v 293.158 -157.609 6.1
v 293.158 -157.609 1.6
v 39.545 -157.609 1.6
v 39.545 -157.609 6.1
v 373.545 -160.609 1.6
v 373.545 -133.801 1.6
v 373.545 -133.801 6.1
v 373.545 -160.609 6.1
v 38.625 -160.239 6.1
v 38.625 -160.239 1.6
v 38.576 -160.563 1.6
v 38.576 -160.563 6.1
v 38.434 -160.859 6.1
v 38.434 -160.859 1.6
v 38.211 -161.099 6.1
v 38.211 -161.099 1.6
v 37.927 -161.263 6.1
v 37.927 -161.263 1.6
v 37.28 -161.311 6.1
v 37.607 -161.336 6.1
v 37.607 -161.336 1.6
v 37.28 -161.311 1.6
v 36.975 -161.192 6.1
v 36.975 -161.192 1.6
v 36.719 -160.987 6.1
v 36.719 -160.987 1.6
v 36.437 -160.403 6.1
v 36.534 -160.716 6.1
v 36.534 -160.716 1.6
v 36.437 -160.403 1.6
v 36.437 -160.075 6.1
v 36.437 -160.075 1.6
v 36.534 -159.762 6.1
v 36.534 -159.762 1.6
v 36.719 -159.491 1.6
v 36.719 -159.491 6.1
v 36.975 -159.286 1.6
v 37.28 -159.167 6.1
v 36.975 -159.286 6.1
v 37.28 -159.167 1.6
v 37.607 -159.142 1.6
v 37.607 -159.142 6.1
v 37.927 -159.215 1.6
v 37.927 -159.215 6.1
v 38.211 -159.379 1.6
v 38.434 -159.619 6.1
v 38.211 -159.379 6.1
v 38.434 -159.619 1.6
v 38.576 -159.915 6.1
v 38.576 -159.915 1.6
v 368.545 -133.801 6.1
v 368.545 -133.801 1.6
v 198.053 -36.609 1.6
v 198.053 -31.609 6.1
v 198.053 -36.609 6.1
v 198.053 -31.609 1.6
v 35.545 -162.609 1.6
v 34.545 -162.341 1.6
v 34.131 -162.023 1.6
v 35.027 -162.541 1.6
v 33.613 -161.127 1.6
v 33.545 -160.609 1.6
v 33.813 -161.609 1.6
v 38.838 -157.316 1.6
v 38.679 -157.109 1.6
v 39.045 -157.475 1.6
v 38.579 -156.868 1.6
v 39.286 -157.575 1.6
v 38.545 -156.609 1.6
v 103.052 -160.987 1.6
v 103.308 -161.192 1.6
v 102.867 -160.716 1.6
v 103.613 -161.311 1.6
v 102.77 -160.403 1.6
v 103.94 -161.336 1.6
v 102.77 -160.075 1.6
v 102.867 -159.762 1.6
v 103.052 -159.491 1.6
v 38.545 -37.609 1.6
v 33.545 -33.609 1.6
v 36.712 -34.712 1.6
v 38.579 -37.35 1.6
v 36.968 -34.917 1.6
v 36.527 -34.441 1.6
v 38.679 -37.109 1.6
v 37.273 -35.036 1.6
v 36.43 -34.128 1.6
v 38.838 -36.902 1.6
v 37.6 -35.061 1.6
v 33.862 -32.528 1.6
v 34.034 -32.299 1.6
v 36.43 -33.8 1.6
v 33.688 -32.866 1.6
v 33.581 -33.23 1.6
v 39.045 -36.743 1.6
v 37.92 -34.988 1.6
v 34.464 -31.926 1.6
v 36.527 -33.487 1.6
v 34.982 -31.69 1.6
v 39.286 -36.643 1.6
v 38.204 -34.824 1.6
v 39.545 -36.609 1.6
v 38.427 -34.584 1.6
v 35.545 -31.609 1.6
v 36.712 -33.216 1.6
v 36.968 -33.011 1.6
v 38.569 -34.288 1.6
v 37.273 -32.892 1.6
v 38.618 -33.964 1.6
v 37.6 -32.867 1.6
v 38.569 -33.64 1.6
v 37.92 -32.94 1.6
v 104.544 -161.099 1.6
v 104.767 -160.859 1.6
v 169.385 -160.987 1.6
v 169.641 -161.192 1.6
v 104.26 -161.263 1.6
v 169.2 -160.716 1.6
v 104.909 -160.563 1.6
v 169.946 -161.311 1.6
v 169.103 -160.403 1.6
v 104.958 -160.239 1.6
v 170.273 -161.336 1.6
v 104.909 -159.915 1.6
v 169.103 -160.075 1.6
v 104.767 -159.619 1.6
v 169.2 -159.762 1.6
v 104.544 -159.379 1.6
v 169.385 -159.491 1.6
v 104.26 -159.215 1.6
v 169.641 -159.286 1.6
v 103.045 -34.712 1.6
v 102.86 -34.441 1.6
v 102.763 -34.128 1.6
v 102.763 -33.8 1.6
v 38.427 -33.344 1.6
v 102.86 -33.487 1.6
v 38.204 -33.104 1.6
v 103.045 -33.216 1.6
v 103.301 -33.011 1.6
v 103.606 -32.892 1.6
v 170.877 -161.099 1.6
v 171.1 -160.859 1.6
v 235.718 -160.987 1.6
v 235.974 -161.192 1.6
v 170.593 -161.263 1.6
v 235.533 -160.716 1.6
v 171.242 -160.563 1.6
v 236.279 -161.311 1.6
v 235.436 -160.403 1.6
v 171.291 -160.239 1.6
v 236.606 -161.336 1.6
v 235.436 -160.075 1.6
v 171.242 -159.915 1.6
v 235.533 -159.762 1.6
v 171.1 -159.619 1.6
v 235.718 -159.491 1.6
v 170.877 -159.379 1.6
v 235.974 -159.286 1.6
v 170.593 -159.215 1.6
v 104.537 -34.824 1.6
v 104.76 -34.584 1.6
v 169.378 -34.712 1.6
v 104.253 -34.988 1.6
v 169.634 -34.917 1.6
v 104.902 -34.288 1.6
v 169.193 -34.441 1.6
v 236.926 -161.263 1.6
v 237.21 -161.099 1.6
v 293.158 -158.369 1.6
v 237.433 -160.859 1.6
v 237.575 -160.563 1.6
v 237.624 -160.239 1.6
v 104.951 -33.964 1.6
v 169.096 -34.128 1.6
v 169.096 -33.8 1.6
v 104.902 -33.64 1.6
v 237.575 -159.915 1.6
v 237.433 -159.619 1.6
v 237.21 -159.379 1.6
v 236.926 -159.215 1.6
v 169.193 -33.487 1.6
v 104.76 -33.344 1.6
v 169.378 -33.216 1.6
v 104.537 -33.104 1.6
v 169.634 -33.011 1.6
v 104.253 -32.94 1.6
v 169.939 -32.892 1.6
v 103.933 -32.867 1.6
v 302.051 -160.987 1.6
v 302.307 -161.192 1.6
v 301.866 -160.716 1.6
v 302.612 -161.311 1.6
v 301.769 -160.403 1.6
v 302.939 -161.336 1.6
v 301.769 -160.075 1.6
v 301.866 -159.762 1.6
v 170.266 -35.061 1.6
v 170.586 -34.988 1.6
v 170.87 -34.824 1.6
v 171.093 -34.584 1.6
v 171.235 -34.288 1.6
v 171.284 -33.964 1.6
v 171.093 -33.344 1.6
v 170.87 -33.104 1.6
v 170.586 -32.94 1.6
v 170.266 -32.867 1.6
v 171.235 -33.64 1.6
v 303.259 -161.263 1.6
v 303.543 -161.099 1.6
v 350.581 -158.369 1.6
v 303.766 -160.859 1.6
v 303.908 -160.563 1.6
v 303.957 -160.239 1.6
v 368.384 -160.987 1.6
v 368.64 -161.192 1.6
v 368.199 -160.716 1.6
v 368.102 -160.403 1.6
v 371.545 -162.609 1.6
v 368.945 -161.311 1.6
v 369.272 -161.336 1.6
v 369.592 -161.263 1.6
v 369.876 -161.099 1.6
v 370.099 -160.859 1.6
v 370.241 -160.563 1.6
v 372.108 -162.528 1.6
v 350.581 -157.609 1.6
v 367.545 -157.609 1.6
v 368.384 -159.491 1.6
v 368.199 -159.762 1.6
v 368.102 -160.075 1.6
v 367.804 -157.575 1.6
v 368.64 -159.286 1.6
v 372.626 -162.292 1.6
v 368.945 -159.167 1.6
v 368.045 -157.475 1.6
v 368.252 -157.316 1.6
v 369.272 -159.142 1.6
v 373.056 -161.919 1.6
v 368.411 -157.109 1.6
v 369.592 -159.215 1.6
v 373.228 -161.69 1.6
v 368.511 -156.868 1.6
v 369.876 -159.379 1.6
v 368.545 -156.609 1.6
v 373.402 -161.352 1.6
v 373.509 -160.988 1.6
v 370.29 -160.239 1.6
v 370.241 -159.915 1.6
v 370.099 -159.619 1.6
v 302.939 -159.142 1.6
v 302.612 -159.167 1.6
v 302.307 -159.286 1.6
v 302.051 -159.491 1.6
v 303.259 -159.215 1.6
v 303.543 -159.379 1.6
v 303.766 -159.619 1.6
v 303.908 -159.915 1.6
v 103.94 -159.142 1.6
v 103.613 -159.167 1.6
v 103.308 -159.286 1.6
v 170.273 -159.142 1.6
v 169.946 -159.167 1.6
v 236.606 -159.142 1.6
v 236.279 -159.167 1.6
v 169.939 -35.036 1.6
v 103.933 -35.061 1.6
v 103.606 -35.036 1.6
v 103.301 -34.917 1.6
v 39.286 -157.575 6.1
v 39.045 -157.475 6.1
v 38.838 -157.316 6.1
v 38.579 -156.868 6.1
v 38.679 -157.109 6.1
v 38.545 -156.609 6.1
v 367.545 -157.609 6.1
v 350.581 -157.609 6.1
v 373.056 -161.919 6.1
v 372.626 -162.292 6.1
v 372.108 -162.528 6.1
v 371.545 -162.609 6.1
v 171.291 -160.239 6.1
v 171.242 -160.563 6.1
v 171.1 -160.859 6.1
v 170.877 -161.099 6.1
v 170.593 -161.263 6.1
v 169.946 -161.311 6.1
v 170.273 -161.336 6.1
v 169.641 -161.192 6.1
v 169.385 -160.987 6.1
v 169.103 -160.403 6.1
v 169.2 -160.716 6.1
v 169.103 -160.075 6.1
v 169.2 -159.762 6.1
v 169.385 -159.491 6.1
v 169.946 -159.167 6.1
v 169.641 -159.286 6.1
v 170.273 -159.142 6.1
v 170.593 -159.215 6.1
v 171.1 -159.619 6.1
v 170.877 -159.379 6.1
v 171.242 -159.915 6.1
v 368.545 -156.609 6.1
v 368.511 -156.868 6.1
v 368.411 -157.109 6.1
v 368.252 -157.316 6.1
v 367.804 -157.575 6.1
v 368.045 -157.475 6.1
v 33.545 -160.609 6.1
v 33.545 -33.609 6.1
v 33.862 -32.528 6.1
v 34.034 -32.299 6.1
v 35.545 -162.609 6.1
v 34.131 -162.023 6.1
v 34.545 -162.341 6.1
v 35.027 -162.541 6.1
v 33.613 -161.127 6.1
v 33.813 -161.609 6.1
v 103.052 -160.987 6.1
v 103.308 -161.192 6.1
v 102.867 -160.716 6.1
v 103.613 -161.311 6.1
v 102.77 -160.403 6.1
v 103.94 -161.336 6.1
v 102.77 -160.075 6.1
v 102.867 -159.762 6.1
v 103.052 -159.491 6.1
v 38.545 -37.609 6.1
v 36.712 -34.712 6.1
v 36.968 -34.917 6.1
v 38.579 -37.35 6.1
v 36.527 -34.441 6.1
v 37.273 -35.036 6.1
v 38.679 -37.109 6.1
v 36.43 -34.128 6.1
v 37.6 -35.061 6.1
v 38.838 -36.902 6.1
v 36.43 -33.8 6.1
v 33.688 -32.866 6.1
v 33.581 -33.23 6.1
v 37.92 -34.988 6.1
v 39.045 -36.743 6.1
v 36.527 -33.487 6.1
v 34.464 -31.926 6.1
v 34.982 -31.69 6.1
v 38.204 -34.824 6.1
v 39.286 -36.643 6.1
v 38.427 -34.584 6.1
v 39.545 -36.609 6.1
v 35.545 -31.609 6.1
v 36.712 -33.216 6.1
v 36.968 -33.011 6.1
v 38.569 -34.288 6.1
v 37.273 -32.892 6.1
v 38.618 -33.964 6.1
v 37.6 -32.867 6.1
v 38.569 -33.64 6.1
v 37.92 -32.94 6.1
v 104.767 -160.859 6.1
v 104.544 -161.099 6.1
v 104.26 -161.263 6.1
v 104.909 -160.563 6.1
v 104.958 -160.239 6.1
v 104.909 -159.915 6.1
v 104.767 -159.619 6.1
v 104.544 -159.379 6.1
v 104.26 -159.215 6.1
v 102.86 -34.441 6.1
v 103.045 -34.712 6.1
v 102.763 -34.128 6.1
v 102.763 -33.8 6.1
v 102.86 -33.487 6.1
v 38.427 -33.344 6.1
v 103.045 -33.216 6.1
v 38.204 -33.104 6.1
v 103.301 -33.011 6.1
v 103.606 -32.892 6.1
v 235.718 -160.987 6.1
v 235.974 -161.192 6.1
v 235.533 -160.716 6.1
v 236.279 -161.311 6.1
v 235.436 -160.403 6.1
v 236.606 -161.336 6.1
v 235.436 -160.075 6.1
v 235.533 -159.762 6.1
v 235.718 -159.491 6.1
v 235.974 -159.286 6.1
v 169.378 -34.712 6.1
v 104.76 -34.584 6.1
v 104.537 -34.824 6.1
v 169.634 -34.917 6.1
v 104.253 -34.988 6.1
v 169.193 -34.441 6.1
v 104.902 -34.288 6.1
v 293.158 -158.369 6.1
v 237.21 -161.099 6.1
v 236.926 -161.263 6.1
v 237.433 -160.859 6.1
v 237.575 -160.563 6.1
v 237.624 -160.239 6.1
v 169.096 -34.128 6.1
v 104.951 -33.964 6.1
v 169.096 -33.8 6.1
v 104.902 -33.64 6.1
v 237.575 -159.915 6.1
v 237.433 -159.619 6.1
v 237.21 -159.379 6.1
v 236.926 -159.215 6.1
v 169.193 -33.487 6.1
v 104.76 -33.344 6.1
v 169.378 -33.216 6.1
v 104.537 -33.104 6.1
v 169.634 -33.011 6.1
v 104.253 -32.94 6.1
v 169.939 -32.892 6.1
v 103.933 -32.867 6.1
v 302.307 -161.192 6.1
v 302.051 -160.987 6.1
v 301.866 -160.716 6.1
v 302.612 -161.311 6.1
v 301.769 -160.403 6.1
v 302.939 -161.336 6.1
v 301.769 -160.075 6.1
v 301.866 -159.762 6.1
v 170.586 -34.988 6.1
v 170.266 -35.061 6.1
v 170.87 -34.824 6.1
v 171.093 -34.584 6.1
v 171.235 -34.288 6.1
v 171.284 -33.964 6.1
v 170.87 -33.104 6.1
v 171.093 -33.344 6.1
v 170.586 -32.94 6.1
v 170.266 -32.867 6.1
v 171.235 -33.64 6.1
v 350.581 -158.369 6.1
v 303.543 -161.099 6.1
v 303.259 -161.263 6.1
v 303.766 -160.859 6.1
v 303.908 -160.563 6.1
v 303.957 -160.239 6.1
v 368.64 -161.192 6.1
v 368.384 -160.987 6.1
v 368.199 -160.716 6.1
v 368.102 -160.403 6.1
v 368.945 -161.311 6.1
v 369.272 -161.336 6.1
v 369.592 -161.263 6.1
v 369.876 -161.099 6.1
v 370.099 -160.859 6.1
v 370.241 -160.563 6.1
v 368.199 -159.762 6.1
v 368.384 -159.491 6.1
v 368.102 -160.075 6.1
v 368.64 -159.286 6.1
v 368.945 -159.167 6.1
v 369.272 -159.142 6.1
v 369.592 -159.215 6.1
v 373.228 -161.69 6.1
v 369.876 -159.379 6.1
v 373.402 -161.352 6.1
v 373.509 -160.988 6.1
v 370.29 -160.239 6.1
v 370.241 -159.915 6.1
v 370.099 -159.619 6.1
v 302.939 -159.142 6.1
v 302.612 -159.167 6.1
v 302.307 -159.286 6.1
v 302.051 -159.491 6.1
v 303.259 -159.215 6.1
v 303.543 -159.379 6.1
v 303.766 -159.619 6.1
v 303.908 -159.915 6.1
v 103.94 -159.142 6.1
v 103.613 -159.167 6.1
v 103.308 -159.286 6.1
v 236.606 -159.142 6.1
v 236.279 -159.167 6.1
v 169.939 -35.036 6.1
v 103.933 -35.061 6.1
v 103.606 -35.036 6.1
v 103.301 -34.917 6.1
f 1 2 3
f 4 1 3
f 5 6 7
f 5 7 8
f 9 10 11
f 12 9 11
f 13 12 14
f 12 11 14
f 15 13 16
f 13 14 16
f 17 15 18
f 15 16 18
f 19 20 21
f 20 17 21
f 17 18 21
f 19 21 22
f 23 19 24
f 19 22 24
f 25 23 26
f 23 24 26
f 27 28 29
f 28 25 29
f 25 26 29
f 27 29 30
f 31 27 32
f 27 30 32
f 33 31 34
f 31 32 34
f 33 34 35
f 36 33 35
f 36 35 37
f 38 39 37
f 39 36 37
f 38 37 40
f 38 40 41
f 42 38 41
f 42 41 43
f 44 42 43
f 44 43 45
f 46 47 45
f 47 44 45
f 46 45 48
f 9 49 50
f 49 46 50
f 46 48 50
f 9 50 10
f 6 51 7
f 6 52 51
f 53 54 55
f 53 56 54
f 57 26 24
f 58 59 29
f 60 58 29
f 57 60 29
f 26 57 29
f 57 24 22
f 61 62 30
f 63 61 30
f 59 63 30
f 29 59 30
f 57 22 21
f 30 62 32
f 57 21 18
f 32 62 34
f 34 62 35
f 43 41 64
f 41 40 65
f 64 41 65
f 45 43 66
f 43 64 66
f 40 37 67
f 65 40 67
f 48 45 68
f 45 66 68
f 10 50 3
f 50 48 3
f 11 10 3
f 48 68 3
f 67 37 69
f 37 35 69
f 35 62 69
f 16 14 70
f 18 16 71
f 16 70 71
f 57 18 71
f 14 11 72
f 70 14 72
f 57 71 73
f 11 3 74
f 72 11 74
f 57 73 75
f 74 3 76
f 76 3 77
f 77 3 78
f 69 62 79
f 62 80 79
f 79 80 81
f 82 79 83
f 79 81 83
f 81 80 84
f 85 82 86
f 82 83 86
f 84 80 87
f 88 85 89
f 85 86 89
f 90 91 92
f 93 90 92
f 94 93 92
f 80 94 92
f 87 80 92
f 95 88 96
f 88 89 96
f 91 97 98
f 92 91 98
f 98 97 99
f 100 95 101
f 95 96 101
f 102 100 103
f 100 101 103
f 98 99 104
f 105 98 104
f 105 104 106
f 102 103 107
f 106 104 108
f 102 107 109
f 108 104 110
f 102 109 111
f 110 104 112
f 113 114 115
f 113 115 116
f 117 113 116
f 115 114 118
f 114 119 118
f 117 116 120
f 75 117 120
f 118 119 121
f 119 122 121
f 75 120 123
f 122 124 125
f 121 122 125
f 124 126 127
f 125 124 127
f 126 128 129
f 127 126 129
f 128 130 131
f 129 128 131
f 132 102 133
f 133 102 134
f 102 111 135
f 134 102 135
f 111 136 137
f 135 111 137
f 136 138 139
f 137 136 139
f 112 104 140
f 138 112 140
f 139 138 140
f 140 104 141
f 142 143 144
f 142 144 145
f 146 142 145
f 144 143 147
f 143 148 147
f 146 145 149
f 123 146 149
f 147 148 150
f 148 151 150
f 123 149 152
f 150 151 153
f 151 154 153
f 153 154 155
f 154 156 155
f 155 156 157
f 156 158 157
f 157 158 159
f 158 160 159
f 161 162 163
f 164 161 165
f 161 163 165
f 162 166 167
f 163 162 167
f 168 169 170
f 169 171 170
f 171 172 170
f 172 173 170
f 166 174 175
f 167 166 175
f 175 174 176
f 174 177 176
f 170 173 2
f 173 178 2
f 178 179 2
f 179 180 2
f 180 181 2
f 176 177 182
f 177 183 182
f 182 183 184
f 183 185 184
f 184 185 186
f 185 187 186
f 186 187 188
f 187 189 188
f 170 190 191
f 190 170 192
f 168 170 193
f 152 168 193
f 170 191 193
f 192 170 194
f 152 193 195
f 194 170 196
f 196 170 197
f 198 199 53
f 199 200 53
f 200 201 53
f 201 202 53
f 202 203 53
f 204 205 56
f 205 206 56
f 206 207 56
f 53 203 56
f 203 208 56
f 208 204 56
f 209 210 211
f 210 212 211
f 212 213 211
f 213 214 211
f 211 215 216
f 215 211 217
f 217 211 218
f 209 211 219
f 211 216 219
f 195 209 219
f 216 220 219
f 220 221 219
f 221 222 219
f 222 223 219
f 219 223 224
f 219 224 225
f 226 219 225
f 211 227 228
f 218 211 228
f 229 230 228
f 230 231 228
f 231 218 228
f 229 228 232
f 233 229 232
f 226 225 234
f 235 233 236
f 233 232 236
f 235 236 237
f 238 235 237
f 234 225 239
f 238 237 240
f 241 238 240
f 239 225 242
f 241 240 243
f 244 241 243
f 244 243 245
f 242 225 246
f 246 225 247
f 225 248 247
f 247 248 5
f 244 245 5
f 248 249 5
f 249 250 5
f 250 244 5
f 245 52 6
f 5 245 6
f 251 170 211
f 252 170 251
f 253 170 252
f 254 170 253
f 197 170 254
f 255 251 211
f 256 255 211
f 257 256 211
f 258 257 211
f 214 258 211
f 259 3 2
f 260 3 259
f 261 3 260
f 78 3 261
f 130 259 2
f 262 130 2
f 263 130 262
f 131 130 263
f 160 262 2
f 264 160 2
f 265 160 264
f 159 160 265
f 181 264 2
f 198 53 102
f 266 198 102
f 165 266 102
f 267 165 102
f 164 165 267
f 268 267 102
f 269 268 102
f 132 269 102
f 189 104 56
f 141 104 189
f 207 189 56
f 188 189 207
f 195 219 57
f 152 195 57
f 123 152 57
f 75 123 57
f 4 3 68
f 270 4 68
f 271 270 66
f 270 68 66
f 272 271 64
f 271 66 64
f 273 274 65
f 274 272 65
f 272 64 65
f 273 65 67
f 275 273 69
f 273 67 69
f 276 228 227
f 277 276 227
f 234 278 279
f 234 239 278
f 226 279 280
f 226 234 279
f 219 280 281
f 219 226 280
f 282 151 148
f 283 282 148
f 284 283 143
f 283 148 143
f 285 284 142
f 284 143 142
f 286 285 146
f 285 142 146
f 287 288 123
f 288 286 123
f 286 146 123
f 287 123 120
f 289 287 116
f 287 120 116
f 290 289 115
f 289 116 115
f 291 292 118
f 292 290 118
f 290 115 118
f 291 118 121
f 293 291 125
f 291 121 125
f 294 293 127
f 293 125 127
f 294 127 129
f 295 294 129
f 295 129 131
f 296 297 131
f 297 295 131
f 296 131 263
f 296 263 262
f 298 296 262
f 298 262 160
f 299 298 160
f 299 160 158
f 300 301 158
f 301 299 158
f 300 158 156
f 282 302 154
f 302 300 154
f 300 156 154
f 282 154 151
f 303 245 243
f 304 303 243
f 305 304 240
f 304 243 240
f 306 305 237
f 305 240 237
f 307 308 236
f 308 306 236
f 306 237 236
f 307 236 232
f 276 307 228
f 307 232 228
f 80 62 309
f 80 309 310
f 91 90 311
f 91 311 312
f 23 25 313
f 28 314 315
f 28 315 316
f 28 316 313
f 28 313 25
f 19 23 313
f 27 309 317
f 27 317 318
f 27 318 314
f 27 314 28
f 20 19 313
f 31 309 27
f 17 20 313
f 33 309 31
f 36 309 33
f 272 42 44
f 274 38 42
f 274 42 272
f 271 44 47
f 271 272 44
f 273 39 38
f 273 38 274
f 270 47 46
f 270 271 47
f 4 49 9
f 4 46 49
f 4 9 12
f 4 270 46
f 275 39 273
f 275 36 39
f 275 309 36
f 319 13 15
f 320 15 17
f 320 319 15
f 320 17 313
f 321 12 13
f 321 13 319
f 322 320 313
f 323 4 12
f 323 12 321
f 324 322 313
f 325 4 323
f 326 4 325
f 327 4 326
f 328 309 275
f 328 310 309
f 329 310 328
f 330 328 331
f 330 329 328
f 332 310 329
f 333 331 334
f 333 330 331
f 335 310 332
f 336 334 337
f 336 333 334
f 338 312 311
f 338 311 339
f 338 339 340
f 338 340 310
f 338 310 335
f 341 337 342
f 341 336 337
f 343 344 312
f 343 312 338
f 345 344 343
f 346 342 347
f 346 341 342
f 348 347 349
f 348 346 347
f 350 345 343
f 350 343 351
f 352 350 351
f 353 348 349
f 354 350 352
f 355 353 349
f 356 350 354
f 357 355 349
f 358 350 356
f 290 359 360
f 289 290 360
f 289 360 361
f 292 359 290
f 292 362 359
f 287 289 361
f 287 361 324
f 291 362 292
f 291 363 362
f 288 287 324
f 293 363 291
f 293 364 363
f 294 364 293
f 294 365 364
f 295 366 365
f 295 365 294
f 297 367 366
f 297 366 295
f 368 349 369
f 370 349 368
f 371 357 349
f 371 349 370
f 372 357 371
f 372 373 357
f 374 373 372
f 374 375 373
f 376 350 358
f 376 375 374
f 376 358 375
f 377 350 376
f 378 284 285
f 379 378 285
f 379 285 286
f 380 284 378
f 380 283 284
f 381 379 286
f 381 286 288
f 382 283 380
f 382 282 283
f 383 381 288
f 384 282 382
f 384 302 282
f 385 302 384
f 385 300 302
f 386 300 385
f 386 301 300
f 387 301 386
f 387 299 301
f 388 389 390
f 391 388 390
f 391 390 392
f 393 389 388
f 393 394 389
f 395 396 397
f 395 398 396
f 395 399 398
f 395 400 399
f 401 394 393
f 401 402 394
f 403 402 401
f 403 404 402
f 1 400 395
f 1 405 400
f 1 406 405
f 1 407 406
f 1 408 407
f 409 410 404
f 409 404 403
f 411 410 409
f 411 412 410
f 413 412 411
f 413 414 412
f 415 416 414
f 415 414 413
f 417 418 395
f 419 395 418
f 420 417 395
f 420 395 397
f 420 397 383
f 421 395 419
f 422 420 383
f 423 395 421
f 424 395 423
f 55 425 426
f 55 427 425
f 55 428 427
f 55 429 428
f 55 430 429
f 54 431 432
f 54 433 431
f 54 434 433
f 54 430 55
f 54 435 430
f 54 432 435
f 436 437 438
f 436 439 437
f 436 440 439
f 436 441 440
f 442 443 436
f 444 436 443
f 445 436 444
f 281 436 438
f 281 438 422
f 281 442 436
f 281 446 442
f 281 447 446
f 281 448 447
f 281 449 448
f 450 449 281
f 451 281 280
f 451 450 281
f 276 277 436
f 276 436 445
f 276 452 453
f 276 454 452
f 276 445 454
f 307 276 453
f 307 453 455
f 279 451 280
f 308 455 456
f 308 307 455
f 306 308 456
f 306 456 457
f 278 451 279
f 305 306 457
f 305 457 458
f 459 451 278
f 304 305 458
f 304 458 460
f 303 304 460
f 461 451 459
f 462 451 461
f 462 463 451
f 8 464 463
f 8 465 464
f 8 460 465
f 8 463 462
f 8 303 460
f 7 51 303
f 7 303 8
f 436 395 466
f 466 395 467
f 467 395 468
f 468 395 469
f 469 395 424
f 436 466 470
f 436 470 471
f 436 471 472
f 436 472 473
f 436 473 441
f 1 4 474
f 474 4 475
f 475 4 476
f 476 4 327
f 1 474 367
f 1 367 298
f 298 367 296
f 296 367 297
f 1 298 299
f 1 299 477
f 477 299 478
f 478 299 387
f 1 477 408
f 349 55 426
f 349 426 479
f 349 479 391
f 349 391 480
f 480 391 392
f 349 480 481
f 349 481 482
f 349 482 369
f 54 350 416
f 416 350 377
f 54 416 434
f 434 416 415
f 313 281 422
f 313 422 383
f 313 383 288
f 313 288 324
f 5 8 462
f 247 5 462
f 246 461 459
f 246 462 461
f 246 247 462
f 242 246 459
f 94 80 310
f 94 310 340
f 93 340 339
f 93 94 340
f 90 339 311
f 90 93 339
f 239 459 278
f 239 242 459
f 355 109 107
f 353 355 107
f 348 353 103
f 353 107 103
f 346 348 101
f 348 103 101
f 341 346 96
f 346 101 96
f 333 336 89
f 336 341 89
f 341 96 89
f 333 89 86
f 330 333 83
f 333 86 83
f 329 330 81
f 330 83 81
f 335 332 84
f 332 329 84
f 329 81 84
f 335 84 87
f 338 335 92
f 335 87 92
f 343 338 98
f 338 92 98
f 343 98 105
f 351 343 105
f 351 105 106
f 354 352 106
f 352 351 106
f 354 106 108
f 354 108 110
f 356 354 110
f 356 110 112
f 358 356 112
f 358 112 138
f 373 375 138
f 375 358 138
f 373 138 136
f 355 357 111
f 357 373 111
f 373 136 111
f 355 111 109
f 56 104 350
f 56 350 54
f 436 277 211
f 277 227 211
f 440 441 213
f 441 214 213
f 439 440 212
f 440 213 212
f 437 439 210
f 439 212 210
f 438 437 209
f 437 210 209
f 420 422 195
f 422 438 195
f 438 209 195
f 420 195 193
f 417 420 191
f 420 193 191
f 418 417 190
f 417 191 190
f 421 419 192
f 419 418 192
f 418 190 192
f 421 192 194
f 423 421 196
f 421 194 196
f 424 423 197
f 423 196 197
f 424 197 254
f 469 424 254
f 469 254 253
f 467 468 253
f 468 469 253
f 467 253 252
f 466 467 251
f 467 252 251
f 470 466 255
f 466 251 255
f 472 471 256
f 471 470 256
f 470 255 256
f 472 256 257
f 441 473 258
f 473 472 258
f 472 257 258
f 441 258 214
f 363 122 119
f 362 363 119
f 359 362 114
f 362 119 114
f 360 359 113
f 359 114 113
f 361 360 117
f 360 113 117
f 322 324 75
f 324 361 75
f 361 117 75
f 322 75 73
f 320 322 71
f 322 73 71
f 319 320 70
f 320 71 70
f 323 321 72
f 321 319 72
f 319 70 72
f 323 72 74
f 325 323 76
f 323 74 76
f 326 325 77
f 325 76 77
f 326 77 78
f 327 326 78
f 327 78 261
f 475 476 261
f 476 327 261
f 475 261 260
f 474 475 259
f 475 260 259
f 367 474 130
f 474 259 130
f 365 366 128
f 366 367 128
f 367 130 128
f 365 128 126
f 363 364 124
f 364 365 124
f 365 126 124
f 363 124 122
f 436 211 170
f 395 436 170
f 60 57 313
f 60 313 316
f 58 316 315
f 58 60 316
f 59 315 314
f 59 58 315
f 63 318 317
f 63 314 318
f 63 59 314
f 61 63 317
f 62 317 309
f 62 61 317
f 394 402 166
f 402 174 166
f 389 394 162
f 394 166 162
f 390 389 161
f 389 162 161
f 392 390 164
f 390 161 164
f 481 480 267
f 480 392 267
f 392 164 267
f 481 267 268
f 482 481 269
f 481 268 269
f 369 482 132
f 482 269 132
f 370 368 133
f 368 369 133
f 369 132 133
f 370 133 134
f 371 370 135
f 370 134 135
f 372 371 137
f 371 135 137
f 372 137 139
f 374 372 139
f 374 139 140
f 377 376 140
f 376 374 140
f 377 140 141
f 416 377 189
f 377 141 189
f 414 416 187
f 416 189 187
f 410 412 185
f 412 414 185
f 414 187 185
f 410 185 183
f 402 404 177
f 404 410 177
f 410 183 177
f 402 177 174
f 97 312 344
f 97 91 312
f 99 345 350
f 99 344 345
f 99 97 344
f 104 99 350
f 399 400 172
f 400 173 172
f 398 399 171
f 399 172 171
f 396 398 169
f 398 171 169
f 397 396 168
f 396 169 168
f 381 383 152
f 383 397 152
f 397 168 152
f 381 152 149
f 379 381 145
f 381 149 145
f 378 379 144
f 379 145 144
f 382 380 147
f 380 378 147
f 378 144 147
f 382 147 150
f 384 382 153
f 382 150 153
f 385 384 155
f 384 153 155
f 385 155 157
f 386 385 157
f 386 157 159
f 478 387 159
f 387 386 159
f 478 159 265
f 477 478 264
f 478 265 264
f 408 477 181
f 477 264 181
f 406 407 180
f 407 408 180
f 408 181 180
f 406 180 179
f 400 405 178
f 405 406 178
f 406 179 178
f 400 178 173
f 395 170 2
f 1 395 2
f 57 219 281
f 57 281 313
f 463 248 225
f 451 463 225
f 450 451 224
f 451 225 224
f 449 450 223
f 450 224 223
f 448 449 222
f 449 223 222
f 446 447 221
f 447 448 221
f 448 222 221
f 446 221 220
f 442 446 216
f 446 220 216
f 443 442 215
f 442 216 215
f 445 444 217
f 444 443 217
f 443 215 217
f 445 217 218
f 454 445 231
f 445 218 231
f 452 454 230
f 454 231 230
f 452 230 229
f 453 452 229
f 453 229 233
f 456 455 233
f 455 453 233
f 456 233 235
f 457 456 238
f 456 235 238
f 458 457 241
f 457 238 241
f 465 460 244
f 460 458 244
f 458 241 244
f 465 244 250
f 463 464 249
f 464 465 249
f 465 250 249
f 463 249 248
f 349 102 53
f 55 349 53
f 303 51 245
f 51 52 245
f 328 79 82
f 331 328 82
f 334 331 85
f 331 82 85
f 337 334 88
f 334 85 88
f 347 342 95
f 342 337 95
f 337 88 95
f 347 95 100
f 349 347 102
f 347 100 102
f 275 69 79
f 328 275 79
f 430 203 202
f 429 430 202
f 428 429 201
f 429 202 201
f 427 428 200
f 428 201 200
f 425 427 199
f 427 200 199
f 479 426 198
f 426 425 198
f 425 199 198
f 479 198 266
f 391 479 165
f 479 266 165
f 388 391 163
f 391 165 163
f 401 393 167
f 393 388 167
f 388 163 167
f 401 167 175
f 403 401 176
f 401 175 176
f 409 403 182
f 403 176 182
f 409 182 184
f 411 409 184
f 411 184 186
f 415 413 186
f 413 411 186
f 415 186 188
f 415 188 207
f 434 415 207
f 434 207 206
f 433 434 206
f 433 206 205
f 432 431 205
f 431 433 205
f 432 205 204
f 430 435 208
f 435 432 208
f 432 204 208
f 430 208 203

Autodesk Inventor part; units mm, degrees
ref_plane "YZ Plane" through (0, 0, 0) normal (1, 0, 0) x (0, 1, 0)
ref_plane "XZ Plane" through (0, 0, 0) normal (0, 1, 0) x (-1, 0, 0)
ref_plane "XY Plane" through (0, 0, 0) normal (0, 0, 1) x (1, 0, 0)
ref_plane "Work Plane2" through (35.545, -31.609, 1.6) normal (0, 0, 1) x (1, 0, 0)
ref_plane "Work Plane1" through (35.545, -31.609, 1.6) normal (0, 0, 1) x (1, 0, 0)
sketch "Sketch1" plane through (35.545, -31.609, 1.6) normal (0, 0, 1) x (1, 0, 0)
  line L0 (0, 0) -> (336, 0) projected
  line L1 (-2, -129) -> (-2, -2) projected
  line L2 (-1.6825, -0.9187) -> (-1.5115, -0.6903) projected
  arc A0 (0, 0) -> (-2, -2) centre (0, -2) ccw
  line L3 (338, -2) -> (338, -129) projected
  line L4 (337.5115, -0.6903) -> (337.6825, -0.9187) projected
  arc A1 (338, -2) -> (336, 0) centre (336, -2) ccw
  line L5 (336, -131) -> (0, -131) projected
  line L6 (337.6825, -130.0813) -> (337.5115, -130.3097) projected
  arc A2 (336, -131) -> (338, -129) centre (336, -129) ccw
  arc A3 (-2, -129) -> (0, -131) centre (0, -129) ccw
  circle A4 centre (1.98, -128.63) radius 1.1 projected
  circle A5 centre (1.98, -128.63) radius 1.1
  circle A6 centre (68.313, -128.63) radius 1.1 projected
  circle A7 centre (134.646, -128.63) radius 1.1 projected
  circle A8 centre (134.646, -128.63) radius 1.1
  circle A9 centre (68.313, -128.63) radius 1.1
  circle A10 centre (200.979, -128.63) radius 1.1 projected
  circle A11 centre (267.312, -128.63) radius 1.1 projected
  circle A12 centre (333.645, -128.63) radius 1.1 projected
  circle A13 centre (333.645, -128.63) radius 1.1
  circle A14 centre (267.312, -128.63) radius 1.1
  circle A15 centre (200.979, -128.63) radius 1.1
  circle A16 centre (333.638, -2.355) radius 1.1 projected
  circle A17 centre (1.973, -2.355) radius 1.1 projected
  circle A18 centre (68.306, -2.355) radius 1.1 projected
  circle A19 centre (134.639, -2.355) radius 1.1 projected
  circle A20 centre (200.972, -2.355) radius 1.1 projected
  circle A21 centre (267.305, -2.355) radius 1.1 projected
  circle A22 centre (333.645, -2.355) radius 1.093
  circle A23 centre (267.305, -2.355) radius 1.1
  circle A24 centre (200.972, -2.355) radius 1.1
  circle A25 centre (134.639, -2.355) radius 1.1
  circle A26 centre (68.306, -2.355) radius 1.1
  circle A27 centre (1.973, -2.355) radius 1.1
  line L7 (3, -4.2357) -> (125.2758, -4.2357) construction
  line L8 (4, -5) -> (332, -5)
  line L9 (333, -6) -> (333, -125)
  line L10 (332, -126) -> (4, -126)
  line L11 (3, -125) -> (3, -6)
  arc A28 (4, -5) -> (3, -6) centre (4, -6) ccw
  arc A29 (333, -6) -> (332, -5) centre (332, -6) ccw
  arc A30 (332, -126) -> (333, -125) centre (332, -125) ccw
  arc A31 (3, -125) -> (4, -126) centre (4, -125) ccw
  line L12 (162.5077, 0) -> (162.5077, -5)
  line L13 (173.4174, -5) -> (173.4174, 0)
  circle A32 centre (320.737, -95.692) radius 0.175 projected
  line L14 (333, -88.192) -> (338, -88.192)
  line L15 (333, -102.192) -> (338, -102.192)
  line L16 (257.6125, -126) -> (315.0362, -126)
  line L17 (315.0362, -126) -> (315.0362, -126.7604)
  line L18 (315.0362, -126.7604) -> (257.6125, -126.7604)
  line L19 (257.6125, -126.7604) -> (257.6125, -126)
  point P0 (-35.545, 31.609)
  point P1 (-1.5115, -130.3097)
  point P2 (335.5, -88.192)
  point P3 (0, -131)
  point P4 (337.6825, -130.0813)
  point P5 (-1.6825, -0.9187)
  point P6 (337.6825, -0.9187)
  dimension "d2" = 5
  dimension "d3" = 5
  dimension "d4" = 5
  dimension "d5" = 5
  dimension "d6" = 1
  dimension "d7" = 1
  dimension "d8" = 1
  dimension "d9" = 1
extrude "Extrusion3" add sketch "Sketch1" along normal blind 4.5 contours L0 L12 L8 A28 L11 A31 L10 L19 L18 L17 A30 L9 L15 L3 A2 L6 L5 A3 L1 A0 L2
properties part number "open_liner_L"
